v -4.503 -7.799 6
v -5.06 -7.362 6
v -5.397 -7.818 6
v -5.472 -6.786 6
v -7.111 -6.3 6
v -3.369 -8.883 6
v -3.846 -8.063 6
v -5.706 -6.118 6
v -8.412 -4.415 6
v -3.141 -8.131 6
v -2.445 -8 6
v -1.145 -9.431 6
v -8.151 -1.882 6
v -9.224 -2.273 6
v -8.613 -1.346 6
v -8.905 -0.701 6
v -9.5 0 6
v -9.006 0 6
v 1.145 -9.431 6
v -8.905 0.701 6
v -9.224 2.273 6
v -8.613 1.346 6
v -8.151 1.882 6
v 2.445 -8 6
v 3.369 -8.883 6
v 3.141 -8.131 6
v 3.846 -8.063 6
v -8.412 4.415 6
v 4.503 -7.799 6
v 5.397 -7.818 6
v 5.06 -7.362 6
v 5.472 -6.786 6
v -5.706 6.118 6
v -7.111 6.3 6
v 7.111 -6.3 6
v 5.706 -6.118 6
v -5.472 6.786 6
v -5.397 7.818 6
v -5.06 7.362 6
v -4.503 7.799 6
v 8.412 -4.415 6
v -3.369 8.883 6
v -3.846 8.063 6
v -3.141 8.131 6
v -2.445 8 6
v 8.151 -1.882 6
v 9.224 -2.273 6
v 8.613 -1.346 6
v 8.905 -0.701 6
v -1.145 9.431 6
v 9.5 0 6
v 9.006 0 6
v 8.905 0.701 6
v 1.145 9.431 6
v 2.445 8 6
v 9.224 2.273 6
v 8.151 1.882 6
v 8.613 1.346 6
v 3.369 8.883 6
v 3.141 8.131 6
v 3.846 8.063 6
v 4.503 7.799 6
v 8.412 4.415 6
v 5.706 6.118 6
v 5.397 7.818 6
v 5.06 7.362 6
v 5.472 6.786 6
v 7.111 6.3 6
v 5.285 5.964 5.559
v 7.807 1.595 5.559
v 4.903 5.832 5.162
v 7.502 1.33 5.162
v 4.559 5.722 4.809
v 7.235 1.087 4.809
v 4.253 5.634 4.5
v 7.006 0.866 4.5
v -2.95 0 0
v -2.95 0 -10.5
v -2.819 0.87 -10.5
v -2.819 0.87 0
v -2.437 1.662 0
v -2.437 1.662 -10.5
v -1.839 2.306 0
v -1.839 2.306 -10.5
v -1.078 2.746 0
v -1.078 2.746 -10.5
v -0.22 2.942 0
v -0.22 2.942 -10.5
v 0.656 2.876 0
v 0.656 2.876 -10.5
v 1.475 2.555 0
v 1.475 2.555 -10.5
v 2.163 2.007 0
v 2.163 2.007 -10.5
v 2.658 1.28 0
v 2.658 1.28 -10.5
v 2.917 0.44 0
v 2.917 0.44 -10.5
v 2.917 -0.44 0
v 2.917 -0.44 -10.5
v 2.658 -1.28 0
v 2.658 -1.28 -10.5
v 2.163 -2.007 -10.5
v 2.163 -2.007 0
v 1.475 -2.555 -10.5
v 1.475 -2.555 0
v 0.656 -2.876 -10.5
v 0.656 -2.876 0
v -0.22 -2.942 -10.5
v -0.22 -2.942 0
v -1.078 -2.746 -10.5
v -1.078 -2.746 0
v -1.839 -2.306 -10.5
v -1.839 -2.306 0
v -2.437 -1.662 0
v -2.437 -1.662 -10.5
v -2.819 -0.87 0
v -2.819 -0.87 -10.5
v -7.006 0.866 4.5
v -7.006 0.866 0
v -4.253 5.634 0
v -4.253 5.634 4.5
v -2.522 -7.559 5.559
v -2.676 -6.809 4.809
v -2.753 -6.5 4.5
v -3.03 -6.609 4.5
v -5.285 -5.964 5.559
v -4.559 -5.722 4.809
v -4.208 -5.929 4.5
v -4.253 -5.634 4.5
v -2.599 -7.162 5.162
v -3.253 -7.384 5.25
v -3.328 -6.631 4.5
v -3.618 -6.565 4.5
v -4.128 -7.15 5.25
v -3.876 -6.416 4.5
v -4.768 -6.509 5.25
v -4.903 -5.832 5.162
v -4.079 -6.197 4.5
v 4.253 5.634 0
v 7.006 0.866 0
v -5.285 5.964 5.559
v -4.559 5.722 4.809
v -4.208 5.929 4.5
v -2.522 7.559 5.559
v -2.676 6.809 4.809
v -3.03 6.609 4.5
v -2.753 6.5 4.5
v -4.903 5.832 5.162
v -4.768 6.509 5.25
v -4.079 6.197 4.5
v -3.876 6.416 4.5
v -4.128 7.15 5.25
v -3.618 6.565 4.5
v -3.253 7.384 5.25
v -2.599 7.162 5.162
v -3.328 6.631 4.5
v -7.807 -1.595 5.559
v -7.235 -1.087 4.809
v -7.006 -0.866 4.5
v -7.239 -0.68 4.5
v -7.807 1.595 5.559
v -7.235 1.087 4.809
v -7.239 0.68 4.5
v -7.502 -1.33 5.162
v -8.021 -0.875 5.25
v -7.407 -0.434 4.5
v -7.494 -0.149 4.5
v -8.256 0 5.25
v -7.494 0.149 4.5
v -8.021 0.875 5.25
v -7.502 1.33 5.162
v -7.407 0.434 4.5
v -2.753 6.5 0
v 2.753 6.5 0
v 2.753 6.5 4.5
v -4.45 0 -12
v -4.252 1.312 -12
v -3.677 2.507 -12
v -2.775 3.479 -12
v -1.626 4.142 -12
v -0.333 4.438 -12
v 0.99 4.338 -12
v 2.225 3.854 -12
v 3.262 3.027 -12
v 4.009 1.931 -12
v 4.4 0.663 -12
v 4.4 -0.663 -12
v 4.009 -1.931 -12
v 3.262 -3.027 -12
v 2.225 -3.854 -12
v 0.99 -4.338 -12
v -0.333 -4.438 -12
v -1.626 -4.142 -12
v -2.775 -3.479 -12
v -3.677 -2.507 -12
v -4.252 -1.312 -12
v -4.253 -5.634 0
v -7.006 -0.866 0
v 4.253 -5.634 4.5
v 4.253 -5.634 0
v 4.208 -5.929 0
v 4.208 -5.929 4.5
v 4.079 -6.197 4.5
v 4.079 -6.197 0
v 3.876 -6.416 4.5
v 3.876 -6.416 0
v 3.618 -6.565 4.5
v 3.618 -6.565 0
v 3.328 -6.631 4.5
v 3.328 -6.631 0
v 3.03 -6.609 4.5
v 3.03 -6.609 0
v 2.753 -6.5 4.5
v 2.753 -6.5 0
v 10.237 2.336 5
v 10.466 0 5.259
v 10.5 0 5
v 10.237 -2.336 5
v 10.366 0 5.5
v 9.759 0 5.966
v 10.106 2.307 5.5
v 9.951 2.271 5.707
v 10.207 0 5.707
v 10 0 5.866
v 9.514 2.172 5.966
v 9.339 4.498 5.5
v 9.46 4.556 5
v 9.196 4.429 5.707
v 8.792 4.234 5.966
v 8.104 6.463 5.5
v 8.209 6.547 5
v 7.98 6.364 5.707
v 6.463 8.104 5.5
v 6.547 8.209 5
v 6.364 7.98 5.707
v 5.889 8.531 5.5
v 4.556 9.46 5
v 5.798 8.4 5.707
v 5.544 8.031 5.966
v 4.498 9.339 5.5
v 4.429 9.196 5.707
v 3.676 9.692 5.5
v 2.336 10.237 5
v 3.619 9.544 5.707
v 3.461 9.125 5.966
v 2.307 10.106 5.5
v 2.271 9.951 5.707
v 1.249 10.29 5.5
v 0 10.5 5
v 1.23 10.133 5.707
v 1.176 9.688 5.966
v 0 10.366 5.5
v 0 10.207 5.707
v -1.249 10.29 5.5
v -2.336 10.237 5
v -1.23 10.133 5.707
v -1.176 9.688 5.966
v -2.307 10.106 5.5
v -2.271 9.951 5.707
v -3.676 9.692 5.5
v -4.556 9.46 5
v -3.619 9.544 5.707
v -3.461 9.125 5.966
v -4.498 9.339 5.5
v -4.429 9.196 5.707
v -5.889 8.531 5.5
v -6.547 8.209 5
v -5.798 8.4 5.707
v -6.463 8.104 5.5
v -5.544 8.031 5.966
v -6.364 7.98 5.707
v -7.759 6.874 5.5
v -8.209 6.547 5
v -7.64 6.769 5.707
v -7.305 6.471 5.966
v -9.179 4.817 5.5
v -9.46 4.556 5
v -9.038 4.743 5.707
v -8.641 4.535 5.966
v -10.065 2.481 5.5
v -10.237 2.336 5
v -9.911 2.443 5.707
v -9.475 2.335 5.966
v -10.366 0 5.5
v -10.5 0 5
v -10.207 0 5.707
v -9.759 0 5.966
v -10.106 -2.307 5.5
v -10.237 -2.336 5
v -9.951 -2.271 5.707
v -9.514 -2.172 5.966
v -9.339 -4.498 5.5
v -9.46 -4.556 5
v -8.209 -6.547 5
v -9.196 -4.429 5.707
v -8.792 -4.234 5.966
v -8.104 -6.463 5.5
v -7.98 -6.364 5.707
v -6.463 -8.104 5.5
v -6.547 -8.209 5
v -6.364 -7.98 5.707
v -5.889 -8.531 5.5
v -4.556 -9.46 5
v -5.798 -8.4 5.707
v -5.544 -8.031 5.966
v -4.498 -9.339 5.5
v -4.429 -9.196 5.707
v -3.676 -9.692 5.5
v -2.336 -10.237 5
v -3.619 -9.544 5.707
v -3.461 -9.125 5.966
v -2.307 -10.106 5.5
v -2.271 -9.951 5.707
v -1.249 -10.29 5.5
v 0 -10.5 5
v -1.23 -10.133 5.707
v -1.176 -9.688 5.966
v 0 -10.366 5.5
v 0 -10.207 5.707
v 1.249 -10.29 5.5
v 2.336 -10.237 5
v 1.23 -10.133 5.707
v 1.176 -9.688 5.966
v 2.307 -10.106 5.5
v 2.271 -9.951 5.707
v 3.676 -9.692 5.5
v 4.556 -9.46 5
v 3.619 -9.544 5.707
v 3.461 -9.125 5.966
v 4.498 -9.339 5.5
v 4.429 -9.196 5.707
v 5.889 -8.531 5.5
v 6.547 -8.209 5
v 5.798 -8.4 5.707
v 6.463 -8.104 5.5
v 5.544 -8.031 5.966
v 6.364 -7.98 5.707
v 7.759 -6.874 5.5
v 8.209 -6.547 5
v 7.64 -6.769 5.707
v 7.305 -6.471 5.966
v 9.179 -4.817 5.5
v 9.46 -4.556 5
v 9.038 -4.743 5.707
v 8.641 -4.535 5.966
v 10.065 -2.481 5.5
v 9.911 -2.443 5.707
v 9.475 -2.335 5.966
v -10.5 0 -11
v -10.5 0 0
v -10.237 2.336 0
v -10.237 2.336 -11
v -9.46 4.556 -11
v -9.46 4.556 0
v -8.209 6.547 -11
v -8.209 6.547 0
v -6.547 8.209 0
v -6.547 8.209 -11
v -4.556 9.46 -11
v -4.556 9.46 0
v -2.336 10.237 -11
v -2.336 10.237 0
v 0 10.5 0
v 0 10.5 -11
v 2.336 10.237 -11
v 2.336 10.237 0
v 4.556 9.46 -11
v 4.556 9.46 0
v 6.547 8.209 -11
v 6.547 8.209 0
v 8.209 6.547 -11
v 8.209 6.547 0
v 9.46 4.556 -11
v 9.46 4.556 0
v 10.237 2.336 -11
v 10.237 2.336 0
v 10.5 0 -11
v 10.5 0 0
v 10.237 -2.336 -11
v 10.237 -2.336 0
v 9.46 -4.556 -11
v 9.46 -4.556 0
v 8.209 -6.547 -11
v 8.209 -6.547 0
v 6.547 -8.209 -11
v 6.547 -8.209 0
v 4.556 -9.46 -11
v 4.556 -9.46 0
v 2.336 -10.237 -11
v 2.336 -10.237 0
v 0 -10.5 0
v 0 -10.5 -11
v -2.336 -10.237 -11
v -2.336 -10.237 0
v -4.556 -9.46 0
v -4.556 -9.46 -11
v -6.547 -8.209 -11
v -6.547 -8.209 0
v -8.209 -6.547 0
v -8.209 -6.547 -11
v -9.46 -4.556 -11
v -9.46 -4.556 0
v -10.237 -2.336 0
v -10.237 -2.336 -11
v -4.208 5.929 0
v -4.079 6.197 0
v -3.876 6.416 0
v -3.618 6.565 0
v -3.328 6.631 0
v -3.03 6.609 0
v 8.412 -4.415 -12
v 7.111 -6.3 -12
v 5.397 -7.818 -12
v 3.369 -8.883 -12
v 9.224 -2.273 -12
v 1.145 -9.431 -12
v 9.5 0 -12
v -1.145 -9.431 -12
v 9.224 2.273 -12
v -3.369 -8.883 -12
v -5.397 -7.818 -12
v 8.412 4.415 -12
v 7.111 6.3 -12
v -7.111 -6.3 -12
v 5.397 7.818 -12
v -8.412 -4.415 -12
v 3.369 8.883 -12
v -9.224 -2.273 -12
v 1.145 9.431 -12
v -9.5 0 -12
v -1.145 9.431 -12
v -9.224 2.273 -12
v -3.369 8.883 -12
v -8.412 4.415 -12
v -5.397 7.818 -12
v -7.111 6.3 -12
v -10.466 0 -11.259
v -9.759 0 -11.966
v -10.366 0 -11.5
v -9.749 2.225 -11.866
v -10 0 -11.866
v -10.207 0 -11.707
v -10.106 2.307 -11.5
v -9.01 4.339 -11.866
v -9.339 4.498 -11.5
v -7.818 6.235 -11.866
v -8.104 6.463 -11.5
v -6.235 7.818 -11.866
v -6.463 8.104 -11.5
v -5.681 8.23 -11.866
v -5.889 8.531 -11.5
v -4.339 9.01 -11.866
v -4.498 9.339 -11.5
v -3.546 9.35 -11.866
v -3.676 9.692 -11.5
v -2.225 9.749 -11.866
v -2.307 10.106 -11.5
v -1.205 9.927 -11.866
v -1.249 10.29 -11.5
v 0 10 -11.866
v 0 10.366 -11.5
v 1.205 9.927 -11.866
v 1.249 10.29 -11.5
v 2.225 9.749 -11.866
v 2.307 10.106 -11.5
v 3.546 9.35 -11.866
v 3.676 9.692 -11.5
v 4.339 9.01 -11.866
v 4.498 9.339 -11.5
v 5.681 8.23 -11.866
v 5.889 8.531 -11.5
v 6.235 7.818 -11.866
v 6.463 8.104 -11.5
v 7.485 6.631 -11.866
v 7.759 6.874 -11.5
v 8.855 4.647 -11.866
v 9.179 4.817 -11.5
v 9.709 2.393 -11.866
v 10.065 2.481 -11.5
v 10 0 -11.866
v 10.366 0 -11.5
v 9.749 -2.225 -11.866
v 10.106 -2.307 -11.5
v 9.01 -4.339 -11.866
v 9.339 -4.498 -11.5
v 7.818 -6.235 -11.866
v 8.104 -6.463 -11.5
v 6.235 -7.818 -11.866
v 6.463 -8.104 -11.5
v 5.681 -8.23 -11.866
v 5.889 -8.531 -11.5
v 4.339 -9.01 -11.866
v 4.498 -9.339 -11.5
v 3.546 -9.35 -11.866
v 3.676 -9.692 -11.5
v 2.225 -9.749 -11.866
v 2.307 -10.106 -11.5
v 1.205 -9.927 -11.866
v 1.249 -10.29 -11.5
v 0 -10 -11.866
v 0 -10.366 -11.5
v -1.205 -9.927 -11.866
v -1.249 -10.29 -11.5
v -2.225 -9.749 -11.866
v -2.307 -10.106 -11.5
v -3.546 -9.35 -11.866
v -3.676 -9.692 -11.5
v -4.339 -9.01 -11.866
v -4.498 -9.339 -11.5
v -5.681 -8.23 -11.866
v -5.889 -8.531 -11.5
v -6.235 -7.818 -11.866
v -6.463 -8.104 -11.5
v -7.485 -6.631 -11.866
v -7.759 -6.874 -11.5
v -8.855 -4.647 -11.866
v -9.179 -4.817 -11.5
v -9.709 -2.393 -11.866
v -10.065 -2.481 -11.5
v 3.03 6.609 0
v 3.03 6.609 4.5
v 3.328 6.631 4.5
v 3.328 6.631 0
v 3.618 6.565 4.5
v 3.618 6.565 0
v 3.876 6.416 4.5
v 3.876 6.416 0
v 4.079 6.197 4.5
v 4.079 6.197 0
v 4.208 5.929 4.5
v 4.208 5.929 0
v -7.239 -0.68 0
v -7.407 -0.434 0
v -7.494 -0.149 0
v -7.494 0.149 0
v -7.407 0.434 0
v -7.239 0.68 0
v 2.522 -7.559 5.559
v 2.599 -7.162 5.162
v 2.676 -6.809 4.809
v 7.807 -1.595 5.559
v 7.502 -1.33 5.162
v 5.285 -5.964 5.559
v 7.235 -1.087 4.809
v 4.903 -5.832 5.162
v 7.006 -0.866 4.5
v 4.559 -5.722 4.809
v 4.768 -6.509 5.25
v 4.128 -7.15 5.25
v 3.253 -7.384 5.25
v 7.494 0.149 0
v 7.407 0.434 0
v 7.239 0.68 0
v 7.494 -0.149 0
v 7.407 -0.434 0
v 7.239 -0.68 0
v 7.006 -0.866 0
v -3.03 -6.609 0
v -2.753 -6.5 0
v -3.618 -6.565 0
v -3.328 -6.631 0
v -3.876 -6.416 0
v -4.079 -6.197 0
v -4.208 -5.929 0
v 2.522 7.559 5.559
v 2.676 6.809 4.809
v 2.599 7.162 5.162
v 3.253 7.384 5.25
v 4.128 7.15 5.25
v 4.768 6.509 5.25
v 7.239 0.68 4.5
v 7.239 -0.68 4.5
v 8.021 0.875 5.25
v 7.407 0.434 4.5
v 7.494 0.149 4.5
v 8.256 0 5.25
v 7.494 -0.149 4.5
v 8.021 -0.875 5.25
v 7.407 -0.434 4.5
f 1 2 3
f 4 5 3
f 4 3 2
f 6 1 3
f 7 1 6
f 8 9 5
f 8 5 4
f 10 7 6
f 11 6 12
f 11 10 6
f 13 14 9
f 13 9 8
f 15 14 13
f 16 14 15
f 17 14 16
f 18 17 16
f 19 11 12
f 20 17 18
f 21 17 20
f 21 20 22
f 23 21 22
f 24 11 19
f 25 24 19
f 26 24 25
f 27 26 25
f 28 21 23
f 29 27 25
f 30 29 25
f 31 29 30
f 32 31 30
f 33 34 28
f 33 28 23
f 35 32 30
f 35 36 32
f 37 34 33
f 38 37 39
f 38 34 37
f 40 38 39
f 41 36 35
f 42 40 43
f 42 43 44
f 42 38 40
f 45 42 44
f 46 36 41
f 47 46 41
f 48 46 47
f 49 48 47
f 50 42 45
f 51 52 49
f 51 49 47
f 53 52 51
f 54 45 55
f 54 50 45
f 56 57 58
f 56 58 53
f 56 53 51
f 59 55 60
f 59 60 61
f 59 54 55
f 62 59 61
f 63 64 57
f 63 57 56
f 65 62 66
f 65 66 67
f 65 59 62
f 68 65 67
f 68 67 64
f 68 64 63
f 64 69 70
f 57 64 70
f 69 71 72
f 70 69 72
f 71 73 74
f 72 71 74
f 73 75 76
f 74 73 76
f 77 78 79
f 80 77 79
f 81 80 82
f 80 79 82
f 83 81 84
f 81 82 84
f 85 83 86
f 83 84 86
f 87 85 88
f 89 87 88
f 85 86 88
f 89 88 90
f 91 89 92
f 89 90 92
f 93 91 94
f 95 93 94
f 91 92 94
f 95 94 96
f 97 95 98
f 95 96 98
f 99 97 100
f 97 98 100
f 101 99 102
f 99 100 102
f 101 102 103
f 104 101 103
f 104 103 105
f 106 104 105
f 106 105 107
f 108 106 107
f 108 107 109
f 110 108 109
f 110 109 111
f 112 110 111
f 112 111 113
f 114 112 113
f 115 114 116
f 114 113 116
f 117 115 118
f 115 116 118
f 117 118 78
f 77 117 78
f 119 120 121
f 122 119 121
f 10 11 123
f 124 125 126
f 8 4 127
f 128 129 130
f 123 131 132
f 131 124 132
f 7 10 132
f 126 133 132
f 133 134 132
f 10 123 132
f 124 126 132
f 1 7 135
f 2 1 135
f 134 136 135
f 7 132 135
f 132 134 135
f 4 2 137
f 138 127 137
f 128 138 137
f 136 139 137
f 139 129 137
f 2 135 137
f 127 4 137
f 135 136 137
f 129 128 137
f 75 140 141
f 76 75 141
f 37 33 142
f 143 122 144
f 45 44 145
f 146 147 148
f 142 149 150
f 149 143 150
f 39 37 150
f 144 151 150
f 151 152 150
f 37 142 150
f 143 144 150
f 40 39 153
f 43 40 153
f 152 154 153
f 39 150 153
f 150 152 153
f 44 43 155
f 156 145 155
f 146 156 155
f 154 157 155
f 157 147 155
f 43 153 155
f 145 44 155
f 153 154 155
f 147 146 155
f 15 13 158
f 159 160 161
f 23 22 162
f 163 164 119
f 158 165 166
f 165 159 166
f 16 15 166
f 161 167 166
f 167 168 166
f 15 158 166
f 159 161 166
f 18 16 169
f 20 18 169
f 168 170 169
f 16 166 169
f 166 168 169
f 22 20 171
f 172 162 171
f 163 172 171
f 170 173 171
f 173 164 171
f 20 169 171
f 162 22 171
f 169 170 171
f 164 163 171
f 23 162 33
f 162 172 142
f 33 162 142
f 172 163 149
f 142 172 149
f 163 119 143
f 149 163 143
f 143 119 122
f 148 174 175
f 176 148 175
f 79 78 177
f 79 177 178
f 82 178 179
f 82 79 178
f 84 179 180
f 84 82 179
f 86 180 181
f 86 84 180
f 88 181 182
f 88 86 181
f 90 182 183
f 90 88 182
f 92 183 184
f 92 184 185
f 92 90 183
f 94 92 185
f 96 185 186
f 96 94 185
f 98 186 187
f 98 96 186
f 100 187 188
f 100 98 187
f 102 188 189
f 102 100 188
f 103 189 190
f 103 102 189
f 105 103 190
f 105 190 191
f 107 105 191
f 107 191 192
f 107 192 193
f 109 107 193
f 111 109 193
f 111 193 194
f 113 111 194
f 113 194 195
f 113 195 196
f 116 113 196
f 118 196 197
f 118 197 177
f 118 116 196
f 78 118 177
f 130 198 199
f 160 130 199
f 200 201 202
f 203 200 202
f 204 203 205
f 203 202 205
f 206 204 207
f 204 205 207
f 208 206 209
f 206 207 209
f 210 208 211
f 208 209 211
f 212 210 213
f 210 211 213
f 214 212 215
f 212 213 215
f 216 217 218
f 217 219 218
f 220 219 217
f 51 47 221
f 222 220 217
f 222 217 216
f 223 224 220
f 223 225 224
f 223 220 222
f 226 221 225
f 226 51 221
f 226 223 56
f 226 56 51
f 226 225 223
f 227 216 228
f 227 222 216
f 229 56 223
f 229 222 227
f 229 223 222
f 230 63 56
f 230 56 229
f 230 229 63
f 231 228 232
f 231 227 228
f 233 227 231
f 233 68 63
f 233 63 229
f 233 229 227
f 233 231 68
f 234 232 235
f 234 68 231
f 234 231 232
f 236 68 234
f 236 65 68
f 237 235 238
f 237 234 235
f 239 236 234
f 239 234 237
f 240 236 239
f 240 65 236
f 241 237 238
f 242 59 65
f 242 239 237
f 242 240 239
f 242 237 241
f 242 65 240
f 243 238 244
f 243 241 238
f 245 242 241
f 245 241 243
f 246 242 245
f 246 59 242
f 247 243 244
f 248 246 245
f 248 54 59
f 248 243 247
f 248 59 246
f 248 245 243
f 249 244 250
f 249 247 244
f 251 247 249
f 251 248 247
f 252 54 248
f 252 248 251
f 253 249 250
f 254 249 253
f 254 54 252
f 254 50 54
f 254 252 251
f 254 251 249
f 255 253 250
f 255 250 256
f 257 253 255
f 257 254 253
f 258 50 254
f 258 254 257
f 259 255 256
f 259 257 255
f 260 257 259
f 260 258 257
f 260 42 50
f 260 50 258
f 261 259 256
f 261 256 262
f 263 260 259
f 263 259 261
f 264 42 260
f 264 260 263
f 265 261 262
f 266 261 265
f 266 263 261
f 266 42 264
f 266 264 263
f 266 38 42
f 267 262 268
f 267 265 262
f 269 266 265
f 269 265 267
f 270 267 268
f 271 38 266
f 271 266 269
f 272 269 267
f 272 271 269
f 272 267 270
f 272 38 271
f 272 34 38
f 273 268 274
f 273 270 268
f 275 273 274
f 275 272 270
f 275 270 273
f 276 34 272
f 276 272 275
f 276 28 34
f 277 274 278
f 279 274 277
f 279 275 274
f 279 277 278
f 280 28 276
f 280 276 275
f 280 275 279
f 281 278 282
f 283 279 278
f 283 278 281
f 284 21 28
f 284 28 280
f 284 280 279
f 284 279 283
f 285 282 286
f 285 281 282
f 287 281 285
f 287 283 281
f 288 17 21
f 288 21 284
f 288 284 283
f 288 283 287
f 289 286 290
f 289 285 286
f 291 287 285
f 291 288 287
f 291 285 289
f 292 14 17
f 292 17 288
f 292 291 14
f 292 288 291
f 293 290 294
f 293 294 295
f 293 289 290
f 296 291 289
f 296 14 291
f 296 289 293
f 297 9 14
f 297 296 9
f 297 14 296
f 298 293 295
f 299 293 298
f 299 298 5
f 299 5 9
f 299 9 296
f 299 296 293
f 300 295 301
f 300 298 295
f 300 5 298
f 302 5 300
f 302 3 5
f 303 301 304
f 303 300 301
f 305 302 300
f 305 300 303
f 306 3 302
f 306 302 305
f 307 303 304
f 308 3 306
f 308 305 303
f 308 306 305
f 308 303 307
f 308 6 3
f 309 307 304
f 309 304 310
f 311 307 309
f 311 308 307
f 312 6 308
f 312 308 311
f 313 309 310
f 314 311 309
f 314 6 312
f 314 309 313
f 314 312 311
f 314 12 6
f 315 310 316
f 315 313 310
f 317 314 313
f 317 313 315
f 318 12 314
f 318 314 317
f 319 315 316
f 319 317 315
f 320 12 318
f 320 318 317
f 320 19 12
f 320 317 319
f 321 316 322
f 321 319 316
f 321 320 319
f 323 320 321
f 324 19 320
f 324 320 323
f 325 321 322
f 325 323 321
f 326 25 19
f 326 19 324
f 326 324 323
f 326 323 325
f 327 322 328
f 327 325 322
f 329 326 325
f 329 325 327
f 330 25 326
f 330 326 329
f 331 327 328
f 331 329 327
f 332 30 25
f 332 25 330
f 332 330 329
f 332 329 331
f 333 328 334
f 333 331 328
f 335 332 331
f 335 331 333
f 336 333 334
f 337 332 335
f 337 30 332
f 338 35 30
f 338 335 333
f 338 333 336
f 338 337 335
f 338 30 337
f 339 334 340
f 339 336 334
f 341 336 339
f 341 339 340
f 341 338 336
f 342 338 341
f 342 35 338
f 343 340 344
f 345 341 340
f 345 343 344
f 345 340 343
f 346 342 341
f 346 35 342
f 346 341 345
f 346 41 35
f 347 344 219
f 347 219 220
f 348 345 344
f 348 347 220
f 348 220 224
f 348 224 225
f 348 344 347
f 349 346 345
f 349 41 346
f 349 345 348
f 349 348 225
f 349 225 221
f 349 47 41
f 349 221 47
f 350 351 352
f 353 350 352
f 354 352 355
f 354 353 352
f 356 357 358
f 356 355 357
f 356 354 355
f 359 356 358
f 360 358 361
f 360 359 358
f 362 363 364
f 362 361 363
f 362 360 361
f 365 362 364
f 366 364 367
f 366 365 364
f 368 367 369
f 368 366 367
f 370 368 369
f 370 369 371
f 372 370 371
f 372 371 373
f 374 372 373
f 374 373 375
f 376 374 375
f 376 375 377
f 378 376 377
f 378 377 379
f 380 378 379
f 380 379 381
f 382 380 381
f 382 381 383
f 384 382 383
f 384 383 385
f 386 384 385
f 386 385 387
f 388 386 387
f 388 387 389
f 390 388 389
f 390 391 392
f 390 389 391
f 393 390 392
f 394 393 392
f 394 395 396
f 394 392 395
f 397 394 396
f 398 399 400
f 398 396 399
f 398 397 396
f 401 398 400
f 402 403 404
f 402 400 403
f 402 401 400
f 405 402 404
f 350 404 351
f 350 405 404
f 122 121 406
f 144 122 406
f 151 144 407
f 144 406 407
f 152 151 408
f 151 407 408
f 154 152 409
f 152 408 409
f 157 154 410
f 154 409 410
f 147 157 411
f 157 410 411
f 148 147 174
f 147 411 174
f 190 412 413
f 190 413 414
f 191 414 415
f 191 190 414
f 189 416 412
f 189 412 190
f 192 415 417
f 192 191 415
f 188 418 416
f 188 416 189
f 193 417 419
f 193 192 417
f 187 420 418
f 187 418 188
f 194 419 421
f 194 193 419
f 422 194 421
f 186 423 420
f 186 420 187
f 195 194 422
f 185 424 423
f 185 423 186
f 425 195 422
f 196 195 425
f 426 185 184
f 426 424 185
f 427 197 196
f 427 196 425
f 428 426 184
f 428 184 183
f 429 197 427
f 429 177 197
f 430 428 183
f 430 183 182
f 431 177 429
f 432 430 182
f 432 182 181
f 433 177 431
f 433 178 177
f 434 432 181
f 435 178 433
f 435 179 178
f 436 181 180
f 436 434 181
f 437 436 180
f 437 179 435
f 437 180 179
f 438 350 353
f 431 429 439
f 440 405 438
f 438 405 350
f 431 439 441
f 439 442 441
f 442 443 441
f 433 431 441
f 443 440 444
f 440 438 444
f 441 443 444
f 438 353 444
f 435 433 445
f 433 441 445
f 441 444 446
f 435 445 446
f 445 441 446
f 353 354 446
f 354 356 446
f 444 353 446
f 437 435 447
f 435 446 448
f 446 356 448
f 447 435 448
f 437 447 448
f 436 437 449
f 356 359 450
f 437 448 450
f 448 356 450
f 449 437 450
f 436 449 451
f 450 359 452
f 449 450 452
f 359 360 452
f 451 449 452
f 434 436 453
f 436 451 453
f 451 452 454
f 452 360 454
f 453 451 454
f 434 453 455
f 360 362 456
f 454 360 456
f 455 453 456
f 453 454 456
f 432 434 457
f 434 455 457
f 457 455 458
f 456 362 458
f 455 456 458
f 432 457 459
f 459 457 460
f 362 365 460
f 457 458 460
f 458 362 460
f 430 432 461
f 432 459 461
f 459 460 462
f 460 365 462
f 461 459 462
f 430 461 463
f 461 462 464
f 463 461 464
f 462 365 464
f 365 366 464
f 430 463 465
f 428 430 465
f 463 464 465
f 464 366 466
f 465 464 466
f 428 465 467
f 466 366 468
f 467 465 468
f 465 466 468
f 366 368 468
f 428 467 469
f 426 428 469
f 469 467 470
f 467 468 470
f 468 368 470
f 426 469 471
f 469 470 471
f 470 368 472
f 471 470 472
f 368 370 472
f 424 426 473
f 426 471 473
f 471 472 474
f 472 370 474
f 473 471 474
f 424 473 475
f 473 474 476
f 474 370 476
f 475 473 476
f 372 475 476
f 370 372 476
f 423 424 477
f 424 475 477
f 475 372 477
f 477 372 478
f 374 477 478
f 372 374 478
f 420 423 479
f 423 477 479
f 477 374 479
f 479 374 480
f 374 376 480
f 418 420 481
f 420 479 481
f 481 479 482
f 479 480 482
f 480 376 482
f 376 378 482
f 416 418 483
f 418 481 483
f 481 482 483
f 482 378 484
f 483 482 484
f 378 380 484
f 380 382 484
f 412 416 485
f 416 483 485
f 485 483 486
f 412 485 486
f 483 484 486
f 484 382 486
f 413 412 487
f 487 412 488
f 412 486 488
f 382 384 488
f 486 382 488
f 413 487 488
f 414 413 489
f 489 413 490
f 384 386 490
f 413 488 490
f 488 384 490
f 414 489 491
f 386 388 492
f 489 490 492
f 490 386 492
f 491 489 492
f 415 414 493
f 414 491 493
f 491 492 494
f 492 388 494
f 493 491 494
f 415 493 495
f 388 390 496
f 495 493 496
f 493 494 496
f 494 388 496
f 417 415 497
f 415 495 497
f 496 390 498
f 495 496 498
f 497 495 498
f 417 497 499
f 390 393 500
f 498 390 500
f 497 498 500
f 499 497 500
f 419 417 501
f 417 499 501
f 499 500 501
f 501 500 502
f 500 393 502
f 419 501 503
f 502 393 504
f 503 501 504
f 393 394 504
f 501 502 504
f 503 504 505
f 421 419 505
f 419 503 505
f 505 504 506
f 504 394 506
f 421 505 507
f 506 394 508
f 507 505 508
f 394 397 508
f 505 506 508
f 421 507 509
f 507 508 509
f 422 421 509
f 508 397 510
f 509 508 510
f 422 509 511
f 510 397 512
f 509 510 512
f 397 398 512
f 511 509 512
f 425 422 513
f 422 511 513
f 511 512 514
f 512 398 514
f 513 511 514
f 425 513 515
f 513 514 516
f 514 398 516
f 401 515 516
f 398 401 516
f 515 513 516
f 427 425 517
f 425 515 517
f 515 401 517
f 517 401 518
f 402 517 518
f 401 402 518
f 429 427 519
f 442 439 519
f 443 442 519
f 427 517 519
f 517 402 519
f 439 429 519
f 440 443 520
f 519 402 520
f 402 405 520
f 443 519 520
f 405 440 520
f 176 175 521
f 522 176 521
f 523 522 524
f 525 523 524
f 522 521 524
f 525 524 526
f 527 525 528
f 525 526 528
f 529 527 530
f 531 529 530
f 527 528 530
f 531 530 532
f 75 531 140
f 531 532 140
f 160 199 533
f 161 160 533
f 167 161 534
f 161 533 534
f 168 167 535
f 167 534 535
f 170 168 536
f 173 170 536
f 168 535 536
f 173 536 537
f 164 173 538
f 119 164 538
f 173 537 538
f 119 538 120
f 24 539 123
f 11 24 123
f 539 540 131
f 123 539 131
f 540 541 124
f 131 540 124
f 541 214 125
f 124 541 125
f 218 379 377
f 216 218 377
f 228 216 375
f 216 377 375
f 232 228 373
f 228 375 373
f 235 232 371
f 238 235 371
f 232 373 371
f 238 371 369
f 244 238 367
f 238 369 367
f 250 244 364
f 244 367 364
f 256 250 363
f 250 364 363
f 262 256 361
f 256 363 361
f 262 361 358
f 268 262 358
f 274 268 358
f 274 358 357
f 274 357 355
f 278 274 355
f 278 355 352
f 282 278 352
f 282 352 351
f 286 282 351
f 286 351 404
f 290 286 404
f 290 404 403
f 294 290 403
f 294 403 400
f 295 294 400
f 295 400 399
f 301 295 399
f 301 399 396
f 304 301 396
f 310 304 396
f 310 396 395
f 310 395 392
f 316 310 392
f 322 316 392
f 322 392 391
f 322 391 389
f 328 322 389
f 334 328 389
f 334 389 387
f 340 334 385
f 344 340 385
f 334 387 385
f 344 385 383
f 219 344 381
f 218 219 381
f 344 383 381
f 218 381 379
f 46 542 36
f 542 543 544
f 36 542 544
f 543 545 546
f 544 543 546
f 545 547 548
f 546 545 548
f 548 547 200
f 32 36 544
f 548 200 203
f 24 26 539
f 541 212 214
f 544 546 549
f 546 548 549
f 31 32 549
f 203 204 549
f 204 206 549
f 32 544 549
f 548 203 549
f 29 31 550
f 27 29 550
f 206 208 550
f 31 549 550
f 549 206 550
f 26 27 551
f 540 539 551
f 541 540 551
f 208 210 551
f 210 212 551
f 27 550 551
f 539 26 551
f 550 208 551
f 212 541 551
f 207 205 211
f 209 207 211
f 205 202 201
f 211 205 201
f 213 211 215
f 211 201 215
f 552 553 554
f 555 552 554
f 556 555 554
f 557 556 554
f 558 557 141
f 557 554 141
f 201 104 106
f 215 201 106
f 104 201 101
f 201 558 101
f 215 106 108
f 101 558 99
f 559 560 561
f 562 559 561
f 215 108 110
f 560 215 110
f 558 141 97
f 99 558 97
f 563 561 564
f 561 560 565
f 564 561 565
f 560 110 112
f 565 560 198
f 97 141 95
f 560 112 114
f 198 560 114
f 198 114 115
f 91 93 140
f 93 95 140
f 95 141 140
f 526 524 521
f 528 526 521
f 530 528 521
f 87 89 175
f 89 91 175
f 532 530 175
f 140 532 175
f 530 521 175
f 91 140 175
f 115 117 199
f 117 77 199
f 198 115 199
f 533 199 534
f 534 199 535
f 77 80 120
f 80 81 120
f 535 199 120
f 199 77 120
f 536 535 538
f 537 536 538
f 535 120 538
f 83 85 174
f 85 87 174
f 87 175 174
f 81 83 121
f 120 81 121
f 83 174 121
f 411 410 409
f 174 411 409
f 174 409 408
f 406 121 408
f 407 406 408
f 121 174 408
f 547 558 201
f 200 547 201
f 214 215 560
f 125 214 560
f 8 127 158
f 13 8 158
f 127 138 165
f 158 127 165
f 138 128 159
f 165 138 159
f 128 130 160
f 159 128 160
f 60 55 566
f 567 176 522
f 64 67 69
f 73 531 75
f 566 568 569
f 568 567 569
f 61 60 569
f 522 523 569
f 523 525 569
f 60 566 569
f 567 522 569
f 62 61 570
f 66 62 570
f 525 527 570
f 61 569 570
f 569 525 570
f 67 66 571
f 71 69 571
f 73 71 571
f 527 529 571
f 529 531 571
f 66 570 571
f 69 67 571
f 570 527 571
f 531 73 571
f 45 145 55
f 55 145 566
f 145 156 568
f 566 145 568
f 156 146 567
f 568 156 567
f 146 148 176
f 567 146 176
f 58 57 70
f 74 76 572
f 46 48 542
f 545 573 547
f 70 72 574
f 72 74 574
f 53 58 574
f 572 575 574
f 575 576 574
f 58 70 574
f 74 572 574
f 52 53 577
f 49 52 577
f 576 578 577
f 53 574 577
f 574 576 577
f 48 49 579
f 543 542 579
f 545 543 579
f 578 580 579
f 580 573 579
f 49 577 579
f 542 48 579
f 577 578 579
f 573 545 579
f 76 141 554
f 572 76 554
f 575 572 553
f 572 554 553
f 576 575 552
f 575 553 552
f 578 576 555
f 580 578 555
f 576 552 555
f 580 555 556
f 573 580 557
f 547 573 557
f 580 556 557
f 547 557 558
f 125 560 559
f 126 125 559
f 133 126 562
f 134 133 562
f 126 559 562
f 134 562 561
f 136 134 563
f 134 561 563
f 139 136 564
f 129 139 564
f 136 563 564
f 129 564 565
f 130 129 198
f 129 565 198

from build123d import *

# Parameters (mm, degrees)
SKETCH1_R           = 10.5
BOSS_EXTRUDE1_DEPTH = 6
BOSS_EXTRUDE2_START = 12
SKETCH2_R           = 10.5
SKETCH2_R_2         = 2.95
BOSS_EXTRUDE2_DEPTH = 12
CHAMFER1_SIZE       = 1.5
FILLET1_R           = 1


with BuildPart() as part:
    # Sketch1 → Boss-Extrude1 (new body)
    with BuildSketch(Plane.XY):
        Circle(SKETCH1_R)
        with BuildLine():
            Line((-2.75277675, 6.5), (2.75277675, 6.5))
            ThreePointArc((2.75277675, 6.5), (3.75277675, 6.5), (4.25277675, 5.633974596))
            Line((4.25277675, 5.633974596), (7.005553499, 0.866025404))
            ThreePointArc((7.005553499, 0.866025404), (7.505553499, 0), (7.005553499, -0.866025404))
            Line((7.005553499, -0.866025404), (4.25277675, -5.633974596))
            ThreePointArc((4.25277675, -5.633974596), (3.75277675, -6.5), (2.75277675, -6.5))
            Line((2.75277675, -6.5), (-2.75277675, -6.5))
            ThreePointArc((-2.75277675, -6.5), (-3.75277675, -6.5), (-4.25277675, -5.633974596))
            Line((-4.25277675, -5.633974596), (-7.005553499, -0.866025404))
            ThreePointArc((-7.005553499, -0.866025404), (-7.505553499, 0), (-7.005553499, 0.866025404))
            Line((-7.005553499, 0.866025404), (-4.25277675, 5.633974596))
            ThreePointArc((-4.25277675, 5.633974596), (-3.75277675, 6.5), (-2.75277675, 6.5))
        make_face(mode=Mode.SUBTRACT)
    extrude(amount=BOSS_EXTRUDE1_DEPTH)

    # Sketch2 → Boss-Extrude2 (add)
    with BuildSketch(Plane(origin=(0, 0, 0), x_dir=(-1, 0, 0), z_dir=(0, 0, -1)).offset(BOSS_EXTRUDE2_START)):
        Circle(SKETCH2_R)
        Circle(SKETCH2_R_2, mode=Mode.SUBTRACT)
    extrude(amount=-BOSS_EXTRUDE2_DEPTH)

    # Chamfer1
    chamfer1_edges = [part.edges().sort_by_distance(p)[0] for p in [
        (-3.75277675, 6.5, 6),
        (-5.629165125, 3.25, 6),
        (-7.505553499, 0, 6),
        (-5.629165125, -3.25, 6),
        (-3.75277675, -6.5, 6),
        (0, -6.5, 6),
        (3.75277675, -6.5, 6),
        (5.629165125, -3.25, 6),
        (7.505553499, 0, 6),
        (5.629165125, 3.25, 6),
        (3.75277675, 6.5, 6),
        (0, 6.5, 6),
        (2.95, 0, -12),
    ]]
    chamfer(chamfer1_edges, length=CHAMFER1_SIZE)

    # Fillet1
    fillet1_edges = [part.edges().sort_by_distance(p)[0] for p in [
        (-10.5, 0, 6),
        (10.5, 0, -12),
    ]]
    fillet(fillet1_edges, radius=FILLET1_R)


solid = part.part
